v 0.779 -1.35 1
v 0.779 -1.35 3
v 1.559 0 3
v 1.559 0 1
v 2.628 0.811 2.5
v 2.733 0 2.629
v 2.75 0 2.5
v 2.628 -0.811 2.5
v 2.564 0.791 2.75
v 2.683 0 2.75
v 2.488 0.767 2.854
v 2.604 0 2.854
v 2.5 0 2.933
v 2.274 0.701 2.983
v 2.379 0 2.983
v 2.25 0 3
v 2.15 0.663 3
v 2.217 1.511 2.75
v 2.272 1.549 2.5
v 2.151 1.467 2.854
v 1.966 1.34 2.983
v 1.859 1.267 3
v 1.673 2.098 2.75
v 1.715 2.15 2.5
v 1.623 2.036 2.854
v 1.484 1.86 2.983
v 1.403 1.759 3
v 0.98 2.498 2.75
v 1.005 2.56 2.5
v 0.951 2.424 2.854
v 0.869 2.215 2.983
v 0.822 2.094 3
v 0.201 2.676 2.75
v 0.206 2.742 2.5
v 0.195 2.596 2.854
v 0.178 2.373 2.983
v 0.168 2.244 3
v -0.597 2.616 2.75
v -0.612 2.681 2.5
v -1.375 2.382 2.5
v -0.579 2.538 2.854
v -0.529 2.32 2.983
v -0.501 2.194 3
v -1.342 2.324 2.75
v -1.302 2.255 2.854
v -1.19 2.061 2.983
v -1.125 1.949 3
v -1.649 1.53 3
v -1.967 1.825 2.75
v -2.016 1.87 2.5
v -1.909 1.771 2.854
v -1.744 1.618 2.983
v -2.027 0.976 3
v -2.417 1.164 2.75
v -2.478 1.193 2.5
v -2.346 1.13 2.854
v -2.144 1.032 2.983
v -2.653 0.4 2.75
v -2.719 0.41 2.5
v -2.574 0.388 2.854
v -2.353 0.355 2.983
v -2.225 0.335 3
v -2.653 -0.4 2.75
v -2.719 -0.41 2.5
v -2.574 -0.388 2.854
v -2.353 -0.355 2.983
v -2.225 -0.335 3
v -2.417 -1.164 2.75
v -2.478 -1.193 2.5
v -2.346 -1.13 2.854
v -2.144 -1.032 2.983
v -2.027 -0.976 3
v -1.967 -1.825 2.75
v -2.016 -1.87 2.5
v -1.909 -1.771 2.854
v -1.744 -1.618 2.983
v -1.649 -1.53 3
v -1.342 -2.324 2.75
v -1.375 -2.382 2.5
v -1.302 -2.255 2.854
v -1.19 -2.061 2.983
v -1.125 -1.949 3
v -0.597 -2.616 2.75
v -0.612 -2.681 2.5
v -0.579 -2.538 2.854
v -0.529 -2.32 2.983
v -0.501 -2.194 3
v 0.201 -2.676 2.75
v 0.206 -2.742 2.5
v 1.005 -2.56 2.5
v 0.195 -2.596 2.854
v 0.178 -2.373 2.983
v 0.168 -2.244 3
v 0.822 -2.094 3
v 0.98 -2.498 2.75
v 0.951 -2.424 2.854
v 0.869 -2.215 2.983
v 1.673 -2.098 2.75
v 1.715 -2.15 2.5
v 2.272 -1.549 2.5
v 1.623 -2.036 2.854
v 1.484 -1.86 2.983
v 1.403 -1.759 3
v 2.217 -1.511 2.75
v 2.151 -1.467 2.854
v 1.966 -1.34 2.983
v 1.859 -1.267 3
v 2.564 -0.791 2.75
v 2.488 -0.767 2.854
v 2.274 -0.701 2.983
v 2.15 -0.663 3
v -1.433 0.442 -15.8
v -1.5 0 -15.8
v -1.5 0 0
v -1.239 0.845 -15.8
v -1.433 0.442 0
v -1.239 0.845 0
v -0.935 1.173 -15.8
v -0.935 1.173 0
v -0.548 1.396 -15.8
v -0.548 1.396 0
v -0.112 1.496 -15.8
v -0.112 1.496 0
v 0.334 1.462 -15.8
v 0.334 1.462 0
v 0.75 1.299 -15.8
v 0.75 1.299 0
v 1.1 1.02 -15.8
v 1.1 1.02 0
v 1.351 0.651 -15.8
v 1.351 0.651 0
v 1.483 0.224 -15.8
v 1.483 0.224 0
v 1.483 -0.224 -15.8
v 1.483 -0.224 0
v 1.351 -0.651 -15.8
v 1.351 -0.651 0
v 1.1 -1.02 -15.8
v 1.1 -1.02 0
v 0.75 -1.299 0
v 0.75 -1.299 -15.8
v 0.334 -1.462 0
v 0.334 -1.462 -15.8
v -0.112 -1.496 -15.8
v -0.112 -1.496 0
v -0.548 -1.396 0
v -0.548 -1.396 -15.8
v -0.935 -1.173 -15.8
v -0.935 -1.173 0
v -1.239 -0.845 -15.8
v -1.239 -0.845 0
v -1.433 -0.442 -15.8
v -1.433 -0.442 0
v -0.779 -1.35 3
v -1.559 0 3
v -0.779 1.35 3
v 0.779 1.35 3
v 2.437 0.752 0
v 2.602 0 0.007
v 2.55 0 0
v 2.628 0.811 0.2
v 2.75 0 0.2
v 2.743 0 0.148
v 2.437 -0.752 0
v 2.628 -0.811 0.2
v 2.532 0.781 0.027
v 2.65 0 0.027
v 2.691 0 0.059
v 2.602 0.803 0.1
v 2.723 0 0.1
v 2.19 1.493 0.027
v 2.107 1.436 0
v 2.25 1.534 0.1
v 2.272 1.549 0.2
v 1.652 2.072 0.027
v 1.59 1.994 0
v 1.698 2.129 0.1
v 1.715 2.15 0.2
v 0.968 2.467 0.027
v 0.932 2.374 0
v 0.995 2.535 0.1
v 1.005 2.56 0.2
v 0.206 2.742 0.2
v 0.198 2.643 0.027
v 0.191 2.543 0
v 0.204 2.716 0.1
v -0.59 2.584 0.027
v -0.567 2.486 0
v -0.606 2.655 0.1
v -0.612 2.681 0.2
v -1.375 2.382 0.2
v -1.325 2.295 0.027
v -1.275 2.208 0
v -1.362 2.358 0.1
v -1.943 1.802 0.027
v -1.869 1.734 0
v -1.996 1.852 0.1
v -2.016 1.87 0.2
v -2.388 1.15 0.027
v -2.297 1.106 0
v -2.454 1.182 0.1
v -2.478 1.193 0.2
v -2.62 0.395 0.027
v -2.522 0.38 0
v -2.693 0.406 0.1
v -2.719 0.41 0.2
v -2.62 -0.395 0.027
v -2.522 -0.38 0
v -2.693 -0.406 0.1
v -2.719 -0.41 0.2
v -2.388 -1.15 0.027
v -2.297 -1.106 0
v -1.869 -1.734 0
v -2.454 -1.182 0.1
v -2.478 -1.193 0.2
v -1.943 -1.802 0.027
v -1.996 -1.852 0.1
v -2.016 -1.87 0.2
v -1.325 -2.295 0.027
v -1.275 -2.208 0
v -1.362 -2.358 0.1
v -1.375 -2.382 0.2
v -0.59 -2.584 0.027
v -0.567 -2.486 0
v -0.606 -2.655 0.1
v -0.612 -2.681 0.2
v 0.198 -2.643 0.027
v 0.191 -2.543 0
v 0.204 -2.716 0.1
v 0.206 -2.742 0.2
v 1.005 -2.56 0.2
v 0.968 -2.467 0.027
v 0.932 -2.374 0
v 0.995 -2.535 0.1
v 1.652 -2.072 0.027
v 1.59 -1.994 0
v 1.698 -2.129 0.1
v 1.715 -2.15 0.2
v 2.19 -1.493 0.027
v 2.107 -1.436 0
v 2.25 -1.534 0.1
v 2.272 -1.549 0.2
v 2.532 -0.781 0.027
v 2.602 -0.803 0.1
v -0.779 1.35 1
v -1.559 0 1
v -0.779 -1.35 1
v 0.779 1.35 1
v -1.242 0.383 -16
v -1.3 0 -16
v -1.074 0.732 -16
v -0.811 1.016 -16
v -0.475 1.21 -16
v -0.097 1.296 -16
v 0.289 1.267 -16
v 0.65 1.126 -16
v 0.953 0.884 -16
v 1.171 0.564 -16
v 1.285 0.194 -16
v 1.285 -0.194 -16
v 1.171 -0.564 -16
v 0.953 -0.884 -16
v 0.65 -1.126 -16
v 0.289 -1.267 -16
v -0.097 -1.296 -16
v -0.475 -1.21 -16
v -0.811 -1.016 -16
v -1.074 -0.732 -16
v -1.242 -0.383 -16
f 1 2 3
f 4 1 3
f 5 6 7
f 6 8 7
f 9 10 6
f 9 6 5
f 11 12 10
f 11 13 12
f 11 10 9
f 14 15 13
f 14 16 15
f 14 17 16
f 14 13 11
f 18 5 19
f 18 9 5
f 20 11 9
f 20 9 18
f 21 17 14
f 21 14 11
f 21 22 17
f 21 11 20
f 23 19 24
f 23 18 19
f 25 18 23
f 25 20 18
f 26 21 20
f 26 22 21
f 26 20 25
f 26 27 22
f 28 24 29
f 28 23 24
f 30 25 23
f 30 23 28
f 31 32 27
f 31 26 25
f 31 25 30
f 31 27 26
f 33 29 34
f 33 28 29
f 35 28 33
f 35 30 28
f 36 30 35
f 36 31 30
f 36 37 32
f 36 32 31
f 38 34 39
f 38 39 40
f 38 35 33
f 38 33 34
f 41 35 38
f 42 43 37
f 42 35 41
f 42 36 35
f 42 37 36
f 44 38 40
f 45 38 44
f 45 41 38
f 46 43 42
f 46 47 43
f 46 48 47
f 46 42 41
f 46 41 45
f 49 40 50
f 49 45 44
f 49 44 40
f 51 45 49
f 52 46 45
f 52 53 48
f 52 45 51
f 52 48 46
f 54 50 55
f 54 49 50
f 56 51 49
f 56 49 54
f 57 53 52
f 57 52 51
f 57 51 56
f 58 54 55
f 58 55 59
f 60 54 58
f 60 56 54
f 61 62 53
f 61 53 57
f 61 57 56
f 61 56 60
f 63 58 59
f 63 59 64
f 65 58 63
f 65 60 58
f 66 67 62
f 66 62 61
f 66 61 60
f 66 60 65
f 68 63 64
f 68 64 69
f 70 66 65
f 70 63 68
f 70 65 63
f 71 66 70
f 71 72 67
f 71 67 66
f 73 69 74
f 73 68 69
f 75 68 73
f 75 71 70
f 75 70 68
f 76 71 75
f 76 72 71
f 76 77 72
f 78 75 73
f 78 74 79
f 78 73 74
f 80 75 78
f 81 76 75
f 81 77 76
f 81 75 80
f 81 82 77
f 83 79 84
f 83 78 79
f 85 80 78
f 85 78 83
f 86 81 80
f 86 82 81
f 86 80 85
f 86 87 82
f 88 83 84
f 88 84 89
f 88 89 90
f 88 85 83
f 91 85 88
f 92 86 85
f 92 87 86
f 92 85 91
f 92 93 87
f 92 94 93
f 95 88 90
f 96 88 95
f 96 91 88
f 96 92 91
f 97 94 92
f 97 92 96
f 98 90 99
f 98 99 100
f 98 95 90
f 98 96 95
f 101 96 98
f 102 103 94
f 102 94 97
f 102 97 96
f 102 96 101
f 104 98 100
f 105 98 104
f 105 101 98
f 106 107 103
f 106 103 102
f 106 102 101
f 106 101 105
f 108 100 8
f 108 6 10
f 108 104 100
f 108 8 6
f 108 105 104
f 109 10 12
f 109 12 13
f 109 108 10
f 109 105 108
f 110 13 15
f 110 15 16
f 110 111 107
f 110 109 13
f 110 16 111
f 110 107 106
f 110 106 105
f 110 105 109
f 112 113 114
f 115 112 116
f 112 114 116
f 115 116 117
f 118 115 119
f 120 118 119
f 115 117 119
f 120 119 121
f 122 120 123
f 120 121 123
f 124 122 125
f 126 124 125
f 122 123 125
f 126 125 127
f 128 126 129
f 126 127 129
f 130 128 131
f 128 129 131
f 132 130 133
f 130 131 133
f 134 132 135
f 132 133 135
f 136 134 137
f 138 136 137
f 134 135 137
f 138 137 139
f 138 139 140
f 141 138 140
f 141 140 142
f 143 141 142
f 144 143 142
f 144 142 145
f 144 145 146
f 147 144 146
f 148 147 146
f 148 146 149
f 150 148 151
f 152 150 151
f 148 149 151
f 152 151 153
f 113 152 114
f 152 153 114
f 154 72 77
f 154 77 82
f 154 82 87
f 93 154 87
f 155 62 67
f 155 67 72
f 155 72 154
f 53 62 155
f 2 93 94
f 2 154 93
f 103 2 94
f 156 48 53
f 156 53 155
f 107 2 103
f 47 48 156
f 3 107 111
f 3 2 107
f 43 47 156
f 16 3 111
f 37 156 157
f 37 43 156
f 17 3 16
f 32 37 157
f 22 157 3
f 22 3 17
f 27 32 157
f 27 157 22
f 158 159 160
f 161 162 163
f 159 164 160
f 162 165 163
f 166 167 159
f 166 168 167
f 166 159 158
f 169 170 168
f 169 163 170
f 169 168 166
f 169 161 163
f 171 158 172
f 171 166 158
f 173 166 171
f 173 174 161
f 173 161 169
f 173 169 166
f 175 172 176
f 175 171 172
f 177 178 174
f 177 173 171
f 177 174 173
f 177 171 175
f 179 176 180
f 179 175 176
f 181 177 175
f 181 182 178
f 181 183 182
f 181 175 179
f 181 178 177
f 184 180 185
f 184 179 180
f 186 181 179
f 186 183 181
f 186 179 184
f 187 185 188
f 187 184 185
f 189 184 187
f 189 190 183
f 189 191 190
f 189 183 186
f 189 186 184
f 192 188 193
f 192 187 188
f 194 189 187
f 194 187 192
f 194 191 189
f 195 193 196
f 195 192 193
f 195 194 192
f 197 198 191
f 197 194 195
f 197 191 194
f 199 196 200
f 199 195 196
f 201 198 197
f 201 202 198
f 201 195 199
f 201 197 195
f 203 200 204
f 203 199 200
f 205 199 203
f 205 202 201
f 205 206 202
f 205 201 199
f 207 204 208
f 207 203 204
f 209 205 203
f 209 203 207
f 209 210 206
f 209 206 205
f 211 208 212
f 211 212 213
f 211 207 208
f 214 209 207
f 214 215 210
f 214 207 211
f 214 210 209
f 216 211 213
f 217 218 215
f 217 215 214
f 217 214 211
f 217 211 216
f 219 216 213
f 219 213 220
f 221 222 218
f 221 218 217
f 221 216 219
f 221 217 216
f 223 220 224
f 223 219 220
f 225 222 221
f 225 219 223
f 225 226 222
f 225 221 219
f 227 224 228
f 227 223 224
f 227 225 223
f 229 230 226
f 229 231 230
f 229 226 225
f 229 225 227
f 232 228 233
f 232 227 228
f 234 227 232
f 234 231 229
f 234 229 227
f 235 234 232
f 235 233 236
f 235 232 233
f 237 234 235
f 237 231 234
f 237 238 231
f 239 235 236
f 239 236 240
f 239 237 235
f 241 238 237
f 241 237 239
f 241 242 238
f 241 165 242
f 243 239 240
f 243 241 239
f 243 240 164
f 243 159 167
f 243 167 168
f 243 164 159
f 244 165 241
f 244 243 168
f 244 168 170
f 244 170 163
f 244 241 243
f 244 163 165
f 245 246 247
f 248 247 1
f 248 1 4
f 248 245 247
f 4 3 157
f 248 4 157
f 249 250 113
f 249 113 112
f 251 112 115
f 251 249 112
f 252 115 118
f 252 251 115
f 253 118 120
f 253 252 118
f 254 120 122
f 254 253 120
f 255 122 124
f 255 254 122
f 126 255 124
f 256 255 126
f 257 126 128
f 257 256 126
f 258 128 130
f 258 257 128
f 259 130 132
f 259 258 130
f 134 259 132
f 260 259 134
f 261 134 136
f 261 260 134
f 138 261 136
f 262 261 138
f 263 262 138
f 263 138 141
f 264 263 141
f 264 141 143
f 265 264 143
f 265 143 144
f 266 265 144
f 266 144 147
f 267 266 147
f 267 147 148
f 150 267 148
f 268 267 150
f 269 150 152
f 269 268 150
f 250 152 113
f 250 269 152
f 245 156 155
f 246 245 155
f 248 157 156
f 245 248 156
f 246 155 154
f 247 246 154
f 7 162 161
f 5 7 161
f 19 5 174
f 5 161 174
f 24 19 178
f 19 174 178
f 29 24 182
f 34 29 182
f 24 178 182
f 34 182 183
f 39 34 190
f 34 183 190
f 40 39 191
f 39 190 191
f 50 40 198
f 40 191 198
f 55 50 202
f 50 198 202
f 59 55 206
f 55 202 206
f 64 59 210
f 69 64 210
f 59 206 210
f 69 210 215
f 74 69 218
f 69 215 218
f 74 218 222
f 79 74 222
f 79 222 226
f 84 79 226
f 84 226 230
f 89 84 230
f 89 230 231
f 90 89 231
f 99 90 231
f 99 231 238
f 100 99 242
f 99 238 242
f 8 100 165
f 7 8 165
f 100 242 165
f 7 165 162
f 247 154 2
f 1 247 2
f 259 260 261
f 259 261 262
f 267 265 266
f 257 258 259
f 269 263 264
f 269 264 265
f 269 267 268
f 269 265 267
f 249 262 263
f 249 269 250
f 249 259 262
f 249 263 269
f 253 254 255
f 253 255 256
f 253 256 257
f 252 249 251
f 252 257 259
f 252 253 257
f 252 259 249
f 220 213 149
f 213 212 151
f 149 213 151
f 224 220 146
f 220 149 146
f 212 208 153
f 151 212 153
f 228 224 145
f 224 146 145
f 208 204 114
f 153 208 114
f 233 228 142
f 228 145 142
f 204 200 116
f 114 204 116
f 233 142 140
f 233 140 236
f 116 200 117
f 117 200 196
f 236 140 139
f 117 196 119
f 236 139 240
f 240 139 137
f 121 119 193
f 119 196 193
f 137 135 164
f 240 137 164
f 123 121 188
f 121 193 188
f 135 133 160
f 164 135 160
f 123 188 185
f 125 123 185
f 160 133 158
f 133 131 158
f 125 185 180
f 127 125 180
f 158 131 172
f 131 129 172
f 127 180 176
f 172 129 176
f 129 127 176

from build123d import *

# Parameters (mm, degrees)
SKETCH_1_R          = 2.75
EXTRUDE_1_DEPTH     = 3
FILLET_1_R          = 0.5
CUT_EXTRUDE_1_DEPTH = 2
SKETCH_3_R          = 1.5
EXTRUDE_2_DEPTH     = 16
CHAMFER_1_SIZE      = 0.2
FILLET_2_R          = 0.2


with BuildPart() as part:
    # 草图1 → 凸台-拉伸1 (new body)
    with BuildSketch(Plane.XY):
        Circle(SKETCH_1_R)
    extrude(amount=EXTRUDE_1_DEPTH)

    # 圆角1
    fillet_1_edges = [part.edges().sort_by_distance(p)[0] for p in [
        (-2.75, 0, 3),
    ]]
    fillet(fillet_1_edges, radius=FILLET_1_R)

    # 草图2 → 切除-拉伸1 (cut)
    with BuildSketch(Plane.XY.offset(3)):
        Polygon((1.558845727, 0), (0.779422863, 1.35), (-0.779422863, 1.35), (-1.558845727, 0), (-0.779422863, -1.35), (0.779422863, -1.35), align=None)
    extrude(amount=-CUT_EXTRUDE_1_DEPTH, mode=Mode.SUBTRACT)

    # 草图3 → 凸台-拉伸2 (add)
    with BuildSketch(Plane(origin=(0, 0, 0), x_dir=(-1, 0, 0), z_dir=(0, 0, -1))):
        Circle(SKETCH_3_R)
    extrude(amount=EXTRUDE_2_DEPTH)

    # 倒角1
    chamfer_1_edges = [part.edges().sort_by_distance(p)[0] for p in [
        (1.5, 0, -16),
    ]]
    chamfer(chamfer_1_edges, length=CHAMFER_1_SIZE)

    # 圆角2
    fillet_2_edges = [part.edges().sort_by_distance(p)[0] for p in [
        (-2.75, 0, 0),
    ]]
    fillet(fillet_2_edges, radius=FILLET_2_R)


solid = part.part
